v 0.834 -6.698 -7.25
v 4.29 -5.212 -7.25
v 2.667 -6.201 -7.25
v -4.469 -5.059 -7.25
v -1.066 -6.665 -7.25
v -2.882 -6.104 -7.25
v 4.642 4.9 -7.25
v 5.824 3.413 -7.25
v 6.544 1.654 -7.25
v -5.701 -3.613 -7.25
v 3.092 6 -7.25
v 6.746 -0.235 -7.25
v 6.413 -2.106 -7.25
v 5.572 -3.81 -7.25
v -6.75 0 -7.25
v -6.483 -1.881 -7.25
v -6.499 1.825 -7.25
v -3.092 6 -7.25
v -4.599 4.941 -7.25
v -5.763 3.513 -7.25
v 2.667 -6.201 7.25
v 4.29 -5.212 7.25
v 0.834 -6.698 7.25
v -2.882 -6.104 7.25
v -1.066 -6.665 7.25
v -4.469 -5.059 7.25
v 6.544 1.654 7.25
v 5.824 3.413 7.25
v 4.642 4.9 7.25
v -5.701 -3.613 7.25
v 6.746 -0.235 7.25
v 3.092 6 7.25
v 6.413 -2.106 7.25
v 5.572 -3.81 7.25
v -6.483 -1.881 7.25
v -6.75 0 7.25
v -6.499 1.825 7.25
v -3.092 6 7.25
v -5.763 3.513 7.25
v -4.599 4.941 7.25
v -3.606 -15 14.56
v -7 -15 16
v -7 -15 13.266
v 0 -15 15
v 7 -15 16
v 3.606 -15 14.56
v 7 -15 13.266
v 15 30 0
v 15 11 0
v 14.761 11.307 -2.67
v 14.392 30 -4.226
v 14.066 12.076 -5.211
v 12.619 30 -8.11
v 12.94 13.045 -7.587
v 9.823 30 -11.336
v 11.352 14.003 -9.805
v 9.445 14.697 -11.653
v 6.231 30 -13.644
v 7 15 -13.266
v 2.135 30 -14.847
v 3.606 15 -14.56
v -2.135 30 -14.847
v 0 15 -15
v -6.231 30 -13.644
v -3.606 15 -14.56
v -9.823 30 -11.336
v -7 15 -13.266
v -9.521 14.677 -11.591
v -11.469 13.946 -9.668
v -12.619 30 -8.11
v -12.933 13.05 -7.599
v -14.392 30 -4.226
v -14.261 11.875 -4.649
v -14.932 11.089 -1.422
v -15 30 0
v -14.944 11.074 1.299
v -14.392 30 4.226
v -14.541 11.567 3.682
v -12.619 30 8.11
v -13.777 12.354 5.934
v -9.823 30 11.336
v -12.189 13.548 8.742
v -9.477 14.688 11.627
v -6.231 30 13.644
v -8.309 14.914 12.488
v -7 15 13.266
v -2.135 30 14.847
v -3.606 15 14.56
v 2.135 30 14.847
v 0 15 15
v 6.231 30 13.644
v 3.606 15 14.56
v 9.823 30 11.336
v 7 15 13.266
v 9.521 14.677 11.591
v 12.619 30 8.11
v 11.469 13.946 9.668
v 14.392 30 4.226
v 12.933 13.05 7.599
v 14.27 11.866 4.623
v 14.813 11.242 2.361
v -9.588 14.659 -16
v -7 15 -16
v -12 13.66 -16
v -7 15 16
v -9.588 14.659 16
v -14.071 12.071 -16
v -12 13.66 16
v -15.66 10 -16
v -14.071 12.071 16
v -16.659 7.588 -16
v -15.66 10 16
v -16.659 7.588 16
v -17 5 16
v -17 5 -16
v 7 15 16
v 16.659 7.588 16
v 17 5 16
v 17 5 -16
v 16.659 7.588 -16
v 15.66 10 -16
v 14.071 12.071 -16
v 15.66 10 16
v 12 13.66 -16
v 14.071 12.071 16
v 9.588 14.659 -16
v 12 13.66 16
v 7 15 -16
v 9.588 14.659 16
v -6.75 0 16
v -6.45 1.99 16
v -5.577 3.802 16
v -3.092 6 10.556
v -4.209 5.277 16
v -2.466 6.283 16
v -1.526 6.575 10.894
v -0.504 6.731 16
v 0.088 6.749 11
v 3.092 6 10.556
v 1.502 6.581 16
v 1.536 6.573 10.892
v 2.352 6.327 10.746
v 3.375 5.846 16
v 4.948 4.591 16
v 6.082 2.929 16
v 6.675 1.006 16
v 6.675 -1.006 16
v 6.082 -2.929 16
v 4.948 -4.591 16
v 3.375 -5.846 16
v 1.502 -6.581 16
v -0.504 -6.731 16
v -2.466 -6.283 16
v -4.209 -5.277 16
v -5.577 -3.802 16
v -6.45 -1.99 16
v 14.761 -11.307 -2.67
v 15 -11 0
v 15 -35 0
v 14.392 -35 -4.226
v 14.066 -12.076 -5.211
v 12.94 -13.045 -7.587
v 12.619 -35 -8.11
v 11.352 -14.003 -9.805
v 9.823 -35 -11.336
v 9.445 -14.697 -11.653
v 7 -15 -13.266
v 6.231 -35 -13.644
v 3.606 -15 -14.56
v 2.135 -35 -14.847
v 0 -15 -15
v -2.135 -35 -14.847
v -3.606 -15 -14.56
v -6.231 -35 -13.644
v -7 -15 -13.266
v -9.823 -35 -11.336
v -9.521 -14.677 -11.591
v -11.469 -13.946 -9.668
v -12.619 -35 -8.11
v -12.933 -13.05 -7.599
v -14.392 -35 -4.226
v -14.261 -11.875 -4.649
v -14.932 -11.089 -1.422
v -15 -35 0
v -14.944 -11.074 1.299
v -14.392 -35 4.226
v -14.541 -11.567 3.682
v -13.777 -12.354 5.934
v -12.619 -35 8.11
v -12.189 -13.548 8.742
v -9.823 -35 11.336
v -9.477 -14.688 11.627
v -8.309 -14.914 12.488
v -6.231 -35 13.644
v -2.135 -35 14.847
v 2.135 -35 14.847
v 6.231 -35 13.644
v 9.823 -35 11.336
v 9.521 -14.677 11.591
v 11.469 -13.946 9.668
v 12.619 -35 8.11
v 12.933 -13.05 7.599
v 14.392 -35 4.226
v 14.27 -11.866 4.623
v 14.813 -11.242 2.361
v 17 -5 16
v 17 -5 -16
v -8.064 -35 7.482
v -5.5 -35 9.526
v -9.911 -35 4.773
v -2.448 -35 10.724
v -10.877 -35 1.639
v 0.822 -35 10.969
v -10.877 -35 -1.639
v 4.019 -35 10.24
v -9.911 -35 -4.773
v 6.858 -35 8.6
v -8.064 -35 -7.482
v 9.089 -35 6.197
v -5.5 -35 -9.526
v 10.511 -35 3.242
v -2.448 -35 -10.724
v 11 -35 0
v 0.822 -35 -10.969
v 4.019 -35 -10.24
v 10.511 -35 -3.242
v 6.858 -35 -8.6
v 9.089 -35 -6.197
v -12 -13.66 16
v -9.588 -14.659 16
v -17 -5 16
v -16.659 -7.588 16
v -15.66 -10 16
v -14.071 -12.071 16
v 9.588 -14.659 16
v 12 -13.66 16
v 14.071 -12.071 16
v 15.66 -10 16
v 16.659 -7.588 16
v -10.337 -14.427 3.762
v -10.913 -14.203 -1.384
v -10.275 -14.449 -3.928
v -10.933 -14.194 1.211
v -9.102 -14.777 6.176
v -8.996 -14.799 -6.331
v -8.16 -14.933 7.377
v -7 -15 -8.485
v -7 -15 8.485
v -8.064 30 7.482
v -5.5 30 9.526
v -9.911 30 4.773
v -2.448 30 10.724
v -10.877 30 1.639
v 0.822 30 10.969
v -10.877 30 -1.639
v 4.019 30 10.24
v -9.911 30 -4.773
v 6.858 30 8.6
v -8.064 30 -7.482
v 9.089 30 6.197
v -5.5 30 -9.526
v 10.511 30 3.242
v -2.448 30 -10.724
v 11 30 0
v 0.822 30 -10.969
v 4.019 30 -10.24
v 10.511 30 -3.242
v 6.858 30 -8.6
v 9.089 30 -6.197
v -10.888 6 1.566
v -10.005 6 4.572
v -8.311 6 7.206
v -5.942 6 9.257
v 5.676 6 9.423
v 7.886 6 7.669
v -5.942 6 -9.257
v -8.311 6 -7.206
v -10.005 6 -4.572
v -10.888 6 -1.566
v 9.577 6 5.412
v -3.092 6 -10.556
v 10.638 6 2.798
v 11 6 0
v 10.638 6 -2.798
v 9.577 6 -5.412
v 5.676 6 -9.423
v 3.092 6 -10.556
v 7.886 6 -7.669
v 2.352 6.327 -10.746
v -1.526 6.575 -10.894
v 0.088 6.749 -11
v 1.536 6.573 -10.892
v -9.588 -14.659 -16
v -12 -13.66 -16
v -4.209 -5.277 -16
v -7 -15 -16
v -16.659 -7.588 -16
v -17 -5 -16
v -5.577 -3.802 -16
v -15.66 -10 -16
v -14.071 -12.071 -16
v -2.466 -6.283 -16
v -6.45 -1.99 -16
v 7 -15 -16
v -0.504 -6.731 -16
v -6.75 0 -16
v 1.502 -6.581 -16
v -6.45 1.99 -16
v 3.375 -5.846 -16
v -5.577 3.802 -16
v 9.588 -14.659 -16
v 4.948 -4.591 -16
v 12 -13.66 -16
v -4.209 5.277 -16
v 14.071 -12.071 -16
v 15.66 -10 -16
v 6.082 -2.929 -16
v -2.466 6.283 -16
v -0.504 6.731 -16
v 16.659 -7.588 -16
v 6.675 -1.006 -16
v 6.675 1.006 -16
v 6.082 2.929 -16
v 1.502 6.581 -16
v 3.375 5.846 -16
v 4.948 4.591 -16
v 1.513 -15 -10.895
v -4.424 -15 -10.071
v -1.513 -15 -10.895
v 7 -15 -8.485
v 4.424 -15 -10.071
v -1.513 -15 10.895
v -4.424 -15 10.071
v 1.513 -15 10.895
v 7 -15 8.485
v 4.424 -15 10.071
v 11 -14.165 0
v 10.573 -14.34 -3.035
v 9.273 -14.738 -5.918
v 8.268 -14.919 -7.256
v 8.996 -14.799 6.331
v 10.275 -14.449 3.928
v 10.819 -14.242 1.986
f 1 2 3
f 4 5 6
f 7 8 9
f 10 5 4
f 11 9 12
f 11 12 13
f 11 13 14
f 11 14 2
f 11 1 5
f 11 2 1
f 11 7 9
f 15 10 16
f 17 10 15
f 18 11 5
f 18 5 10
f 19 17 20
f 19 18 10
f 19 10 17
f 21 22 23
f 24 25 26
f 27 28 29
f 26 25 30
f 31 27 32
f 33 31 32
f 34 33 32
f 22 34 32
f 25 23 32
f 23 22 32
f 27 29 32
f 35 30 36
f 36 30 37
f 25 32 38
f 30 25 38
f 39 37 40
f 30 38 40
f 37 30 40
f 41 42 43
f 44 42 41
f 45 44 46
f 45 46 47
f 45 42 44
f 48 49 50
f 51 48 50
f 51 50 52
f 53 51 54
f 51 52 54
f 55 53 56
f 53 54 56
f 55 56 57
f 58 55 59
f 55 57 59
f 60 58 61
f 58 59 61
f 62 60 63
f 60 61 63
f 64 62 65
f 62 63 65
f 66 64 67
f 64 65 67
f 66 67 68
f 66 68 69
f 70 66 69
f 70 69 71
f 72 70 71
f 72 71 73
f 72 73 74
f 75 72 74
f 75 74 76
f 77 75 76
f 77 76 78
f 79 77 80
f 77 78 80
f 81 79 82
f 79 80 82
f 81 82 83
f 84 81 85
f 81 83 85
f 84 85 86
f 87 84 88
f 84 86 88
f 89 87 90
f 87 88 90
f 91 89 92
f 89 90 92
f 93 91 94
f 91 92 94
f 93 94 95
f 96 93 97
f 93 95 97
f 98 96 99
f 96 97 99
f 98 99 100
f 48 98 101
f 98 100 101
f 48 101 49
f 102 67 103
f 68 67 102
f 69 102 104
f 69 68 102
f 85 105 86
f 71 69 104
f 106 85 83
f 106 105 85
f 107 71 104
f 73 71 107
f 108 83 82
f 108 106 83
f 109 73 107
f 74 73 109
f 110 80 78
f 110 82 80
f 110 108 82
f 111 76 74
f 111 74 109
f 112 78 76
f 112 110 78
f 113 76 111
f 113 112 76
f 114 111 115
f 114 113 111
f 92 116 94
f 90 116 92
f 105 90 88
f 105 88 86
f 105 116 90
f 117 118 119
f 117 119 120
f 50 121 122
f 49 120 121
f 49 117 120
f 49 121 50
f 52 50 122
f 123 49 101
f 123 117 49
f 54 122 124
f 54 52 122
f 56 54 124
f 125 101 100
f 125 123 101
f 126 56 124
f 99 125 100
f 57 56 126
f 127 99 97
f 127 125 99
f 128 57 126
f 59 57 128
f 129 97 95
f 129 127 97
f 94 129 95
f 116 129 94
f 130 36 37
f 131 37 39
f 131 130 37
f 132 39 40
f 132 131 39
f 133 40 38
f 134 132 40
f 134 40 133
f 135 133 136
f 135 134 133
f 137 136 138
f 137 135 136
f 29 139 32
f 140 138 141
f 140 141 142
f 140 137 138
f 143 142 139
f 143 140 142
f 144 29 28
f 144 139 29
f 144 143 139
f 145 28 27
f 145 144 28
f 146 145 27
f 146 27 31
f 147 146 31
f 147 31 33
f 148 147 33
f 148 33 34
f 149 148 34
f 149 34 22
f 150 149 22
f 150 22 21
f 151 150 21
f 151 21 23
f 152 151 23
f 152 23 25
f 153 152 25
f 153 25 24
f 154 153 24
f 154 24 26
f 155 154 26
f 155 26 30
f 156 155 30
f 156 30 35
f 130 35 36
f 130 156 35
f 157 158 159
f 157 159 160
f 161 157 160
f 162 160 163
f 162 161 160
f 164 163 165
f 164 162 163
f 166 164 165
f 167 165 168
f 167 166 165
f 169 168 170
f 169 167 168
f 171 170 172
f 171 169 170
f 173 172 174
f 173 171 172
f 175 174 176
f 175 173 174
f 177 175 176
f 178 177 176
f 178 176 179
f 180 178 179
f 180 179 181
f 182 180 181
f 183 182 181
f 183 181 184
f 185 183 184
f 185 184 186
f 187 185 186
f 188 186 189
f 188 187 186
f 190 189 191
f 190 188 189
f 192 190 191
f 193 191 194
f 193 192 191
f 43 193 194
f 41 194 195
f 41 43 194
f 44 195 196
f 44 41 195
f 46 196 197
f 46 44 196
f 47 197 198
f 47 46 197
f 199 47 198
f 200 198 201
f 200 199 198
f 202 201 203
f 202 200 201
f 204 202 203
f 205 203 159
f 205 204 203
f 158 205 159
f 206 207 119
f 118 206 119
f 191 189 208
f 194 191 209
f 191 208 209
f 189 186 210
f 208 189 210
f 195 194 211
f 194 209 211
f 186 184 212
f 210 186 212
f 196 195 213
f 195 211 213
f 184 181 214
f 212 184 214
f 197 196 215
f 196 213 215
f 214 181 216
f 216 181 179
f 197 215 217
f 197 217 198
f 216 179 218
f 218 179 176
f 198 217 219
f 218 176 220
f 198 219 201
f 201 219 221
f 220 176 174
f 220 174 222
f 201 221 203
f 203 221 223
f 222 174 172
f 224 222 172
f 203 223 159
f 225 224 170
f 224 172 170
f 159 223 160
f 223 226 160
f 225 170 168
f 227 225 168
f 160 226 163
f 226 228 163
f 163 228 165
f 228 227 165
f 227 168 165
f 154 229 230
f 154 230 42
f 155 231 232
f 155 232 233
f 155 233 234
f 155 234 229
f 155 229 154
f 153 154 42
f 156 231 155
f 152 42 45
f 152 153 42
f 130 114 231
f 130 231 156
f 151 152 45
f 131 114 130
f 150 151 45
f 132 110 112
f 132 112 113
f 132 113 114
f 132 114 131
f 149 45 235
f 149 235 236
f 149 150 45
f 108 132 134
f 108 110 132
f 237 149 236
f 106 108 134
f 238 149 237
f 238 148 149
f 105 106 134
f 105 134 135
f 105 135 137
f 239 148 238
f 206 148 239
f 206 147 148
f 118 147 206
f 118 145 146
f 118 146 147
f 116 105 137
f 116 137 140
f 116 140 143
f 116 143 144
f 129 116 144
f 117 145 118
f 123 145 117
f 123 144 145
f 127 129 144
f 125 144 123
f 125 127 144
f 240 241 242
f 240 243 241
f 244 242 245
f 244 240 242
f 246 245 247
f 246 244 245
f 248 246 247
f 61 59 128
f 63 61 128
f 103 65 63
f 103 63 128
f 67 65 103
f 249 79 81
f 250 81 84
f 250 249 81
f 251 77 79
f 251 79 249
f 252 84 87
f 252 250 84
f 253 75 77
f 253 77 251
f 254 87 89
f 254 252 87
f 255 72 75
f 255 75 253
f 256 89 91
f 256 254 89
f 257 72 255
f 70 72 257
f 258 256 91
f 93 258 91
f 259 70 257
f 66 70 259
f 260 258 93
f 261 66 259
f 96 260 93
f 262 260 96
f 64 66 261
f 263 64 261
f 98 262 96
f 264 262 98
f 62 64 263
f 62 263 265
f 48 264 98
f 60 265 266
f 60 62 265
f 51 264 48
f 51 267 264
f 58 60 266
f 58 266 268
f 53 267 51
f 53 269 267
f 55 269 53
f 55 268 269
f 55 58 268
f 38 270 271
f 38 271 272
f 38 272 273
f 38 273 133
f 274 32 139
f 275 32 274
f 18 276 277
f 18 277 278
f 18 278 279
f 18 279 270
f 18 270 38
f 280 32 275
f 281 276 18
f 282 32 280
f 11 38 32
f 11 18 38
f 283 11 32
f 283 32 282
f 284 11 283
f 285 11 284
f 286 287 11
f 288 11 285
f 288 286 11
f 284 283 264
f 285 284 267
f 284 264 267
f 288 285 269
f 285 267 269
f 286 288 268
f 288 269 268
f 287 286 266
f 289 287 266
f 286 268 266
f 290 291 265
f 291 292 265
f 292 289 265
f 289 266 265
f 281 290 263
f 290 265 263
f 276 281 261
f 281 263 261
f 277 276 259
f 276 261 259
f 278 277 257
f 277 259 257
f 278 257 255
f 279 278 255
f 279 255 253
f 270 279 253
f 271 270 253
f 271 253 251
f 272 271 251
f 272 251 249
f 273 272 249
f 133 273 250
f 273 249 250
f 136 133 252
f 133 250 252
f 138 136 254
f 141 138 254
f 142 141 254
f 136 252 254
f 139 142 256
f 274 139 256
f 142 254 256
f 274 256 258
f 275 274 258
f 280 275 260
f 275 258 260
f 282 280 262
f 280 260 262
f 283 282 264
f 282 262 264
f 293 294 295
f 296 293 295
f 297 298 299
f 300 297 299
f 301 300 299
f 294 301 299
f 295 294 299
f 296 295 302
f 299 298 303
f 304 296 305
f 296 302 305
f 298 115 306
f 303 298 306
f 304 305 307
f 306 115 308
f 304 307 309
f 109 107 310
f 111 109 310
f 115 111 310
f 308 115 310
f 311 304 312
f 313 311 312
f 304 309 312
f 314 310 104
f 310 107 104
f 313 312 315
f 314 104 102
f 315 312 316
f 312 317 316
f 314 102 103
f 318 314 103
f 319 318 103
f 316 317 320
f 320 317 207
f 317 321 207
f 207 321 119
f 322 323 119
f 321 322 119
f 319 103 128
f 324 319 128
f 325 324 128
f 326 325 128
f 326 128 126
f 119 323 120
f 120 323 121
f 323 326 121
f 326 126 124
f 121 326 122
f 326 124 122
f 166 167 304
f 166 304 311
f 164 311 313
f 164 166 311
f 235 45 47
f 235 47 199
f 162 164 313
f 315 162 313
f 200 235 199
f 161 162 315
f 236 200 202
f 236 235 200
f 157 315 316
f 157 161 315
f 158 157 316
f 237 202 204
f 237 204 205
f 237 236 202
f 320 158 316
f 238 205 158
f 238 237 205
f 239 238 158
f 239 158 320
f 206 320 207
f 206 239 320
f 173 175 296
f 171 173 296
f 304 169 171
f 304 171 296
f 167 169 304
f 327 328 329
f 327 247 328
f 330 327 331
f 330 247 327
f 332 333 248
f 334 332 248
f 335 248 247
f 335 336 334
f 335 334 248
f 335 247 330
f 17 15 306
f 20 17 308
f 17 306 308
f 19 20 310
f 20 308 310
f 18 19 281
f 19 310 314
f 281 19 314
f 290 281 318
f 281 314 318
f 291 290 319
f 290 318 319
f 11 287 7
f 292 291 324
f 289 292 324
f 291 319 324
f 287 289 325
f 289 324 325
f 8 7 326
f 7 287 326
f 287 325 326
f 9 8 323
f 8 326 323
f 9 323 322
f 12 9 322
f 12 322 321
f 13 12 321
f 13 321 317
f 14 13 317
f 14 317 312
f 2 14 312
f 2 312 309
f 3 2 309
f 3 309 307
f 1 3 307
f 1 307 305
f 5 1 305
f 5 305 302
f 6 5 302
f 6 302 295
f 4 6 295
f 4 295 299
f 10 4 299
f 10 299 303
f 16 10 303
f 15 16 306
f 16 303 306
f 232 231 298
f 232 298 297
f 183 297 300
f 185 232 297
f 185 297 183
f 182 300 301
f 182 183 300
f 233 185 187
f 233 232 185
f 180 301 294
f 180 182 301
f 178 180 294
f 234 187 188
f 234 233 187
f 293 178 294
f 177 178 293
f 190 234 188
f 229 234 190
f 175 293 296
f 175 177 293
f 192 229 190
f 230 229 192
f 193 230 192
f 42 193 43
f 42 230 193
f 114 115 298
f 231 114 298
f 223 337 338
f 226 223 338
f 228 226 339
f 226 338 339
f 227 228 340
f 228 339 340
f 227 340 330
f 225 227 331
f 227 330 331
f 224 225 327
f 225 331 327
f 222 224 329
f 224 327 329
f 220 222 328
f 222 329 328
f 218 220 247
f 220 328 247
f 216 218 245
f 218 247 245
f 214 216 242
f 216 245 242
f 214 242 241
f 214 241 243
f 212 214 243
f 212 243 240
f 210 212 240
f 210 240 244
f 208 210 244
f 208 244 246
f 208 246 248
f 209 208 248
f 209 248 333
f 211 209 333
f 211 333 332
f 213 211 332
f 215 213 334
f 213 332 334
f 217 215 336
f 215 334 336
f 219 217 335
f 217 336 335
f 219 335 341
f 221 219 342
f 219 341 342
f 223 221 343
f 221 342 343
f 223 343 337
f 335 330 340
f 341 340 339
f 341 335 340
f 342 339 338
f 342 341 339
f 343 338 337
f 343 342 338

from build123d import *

# Parameters (mm, degrees)
BOSS_EXTRUDE1_DEPTH      = 16
SKETCH2_R                = 15
SKETCH2_R_2              = 11
BOSS_EXTRUDE2_DEPTH      = 30
BOSS_EXTRUDE2_DEPTH_BACK = 35
SKETCH3_R                = 6.75
CUT_EXTRUDE1_DEPTH       = 8.75
SKETCH4_R                = 11
CUT_EXTRUDE2_DEPTH       = 24


with BuildPart() as part:
    # Sketch1 → Boss-Extrude1 (new body, symmetric)
    with BuildSketch(Plane.XY):
        with BuildLine():
            Line((-7, -15), (7, -15))
            ThreePointArc((7, -15), (14.071067812, -12.071067812), (17, -5))
            Line((17, -5), (17, 5))
            ThreePointArc((17, 5), (14.071067812, 12.071067812), (7, 15))
            Line((7, 15), (-7, 15))
            ThreePointArc((-7, 15), (-14.071067812, 12.071067812), (-17, 5))
            Line((-17, 5), (-17, -5))
            ThreePointArc((-17, -5), (-14.071067812, -12.071067812), (-7, -15))
        make_face()
    extrude(amount=BOSS_EXTRUDE1_DEPTH, both=True)

    # Sketch2 → Boss-Extrude2 (add, two sides)
    with BuildSketch(Plane(origin=(0, 0, 0), x_dir=(1, 0, 0), z_dir=(0, 1, 0))) as boss_extrude2_sk:
        Circle(SKETCH2_R)
        Circle(SKETCH2_R_2, mode=Mode.SUBTRACT)
    extrude(amount=BOSS_EXTRUDE2_DEPTH)
    extrude(boss_extrude2_sk.sketch, amount=-BOSS_EXTRUDE2_DEPTH_BACK)

    # Sketch3 → Cut-Extrude1 (cut)
    with BuildSketch(Plane(origin=(0, 0, -16), x_dir=(-1, 0, 0), z_dir=(0, 0, -1))):
        Circle(SKETCH3_R)
    cut_extrude1 = extrude(amount=-CUT_EXTRUDE1_DEPTH, mode=Mode.SUBTRACT)

    # Mirror1: Cut-Extrude1 across plane
    add(cut_extrude1.mirror(Plane.XY), mode=Mode.SUBTRACT)

    # Sketch4 → Cut-Extrude2 (cut)
    with BuildSketch(Plane(origin=(0, 30, 0), x_dir=(1, 0, 0), z_dir=(0, 1, 0))):
        Circle(SKETCH4_R)
    extrude(amount=-CUT_EXTRUDE2_DEPTH, mode=Mode.SUBTRACT)


solid = part.part
